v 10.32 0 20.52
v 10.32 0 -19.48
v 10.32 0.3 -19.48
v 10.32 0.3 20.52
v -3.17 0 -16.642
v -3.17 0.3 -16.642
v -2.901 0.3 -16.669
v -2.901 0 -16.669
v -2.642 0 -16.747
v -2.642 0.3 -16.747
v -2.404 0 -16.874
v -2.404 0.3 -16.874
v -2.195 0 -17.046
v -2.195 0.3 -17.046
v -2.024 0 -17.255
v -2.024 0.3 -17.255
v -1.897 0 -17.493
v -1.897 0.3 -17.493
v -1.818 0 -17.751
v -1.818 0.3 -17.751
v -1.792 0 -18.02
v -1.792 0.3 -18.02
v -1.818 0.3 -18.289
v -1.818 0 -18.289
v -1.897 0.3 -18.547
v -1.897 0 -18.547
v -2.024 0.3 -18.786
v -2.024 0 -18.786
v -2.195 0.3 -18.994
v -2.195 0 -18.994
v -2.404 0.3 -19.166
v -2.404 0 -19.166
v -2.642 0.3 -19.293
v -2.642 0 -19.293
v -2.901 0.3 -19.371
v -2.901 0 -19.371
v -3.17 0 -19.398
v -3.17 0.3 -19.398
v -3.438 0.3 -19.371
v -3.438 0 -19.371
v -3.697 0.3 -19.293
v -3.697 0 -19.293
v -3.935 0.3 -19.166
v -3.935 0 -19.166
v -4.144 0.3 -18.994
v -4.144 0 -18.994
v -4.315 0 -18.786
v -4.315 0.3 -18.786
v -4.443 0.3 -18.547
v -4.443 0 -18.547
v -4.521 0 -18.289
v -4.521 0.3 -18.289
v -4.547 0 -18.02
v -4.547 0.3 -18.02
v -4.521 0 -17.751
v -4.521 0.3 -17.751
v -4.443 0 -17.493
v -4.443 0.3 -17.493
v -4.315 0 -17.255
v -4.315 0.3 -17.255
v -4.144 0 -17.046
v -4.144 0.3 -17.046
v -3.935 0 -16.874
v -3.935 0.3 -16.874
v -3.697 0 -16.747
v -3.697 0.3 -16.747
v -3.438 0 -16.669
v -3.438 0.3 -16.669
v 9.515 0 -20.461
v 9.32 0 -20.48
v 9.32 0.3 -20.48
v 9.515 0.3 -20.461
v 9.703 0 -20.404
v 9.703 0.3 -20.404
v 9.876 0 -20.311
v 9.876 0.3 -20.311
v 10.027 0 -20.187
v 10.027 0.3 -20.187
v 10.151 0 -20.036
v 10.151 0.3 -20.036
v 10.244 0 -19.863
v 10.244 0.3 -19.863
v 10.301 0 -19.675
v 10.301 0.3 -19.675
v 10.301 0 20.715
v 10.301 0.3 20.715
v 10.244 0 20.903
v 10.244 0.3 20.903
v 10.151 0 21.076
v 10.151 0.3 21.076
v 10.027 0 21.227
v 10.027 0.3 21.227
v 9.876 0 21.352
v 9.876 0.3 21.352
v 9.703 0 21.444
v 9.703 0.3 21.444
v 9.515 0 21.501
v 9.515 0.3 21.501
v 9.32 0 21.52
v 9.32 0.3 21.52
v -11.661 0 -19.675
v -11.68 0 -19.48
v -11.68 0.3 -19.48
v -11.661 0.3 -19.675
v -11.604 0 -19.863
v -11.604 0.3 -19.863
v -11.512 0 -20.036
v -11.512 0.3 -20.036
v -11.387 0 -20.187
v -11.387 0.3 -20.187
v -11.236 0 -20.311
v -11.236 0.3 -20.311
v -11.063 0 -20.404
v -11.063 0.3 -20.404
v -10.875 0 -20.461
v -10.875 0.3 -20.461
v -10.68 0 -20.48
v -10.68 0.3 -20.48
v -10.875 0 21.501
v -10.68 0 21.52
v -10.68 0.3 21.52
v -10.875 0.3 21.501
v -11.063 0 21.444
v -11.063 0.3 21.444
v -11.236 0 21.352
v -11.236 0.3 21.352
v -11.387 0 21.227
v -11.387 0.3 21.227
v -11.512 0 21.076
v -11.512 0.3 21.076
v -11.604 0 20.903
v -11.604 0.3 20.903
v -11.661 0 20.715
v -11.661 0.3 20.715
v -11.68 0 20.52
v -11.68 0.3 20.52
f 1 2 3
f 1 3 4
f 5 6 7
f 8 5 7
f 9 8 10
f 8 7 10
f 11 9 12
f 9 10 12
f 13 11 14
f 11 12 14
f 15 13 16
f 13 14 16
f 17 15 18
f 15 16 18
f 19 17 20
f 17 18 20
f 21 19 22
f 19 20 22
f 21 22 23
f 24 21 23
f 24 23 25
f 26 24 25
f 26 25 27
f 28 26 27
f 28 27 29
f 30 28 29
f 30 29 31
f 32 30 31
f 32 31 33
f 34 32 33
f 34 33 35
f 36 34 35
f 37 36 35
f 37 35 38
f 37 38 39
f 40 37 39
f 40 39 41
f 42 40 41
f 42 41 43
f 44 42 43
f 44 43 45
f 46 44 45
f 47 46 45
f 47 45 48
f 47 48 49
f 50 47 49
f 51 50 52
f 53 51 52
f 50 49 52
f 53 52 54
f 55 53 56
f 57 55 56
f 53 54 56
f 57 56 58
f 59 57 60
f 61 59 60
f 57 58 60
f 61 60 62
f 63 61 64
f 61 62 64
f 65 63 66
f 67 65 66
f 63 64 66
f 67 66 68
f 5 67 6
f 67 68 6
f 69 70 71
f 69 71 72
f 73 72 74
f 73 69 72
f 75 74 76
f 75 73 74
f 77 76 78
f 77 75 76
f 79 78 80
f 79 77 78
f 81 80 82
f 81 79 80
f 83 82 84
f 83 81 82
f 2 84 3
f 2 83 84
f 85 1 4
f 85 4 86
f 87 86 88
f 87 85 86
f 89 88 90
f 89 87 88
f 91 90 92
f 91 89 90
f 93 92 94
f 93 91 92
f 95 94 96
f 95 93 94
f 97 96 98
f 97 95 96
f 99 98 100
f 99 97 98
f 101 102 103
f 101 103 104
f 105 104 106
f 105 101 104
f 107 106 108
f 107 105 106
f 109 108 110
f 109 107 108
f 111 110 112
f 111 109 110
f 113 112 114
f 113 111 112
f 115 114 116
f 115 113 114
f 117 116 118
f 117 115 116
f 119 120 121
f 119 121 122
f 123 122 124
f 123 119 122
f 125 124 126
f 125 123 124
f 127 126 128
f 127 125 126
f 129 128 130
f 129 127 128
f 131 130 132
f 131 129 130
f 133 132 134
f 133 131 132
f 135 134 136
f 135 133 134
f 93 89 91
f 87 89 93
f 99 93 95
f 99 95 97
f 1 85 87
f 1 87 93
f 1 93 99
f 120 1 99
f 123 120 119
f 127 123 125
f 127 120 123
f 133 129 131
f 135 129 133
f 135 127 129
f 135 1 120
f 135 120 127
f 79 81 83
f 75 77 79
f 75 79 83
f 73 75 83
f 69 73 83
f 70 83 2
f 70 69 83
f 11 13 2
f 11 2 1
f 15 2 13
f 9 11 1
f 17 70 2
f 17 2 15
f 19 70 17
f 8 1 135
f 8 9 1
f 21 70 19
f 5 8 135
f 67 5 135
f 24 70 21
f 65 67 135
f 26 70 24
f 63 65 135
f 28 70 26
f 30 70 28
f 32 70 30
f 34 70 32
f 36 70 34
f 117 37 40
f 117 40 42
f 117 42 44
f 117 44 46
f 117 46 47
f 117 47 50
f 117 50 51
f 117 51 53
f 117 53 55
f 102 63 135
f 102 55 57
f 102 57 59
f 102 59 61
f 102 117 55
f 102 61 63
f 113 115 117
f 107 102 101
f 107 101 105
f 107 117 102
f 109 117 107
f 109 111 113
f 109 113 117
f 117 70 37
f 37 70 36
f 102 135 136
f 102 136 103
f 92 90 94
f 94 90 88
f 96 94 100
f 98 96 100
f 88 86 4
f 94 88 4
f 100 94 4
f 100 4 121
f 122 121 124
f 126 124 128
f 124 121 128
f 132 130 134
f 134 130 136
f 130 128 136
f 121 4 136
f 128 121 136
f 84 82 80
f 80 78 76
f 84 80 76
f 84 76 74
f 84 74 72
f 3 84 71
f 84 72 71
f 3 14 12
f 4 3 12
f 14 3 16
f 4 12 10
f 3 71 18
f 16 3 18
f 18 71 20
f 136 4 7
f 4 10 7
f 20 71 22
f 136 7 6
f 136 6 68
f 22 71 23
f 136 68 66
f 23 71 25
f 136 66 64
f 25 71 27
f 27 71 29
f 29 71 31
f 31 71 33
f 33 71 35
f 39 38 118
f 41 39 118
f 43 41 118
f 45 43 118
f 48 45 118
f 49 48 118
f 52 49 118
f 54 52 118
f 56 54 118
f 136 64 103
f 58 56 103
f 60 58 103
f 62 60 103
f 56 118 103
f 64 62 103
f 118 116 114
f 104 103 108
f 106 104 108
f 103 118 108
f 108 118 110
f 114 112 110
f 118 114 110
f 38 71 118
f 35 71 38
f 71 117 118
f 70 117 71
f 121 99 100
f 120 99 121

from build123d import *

# Parameters (mm, degrees)
BOSS_EXTRUDE1_DEPTH = 0.3
CUT_EXTRUDE1_REACH  = 26.487
SKETCH5_R           = 1.37778755


with BuildPart() as part:
    # Sketch1 → Boss-Extrude1 (new body)
    with BuildSketch(Plane(origin=(0, 0, 0), x_dir=(1, 0, 0), z_dir=(0, 1, 0))):
        with BuildLine():
            Line((-10.68004988, 20.47995012), (9.31995012, 20.47995012))
            ThreePointArc((9.31995012, 20.47995012), (10.027056901, 20.187056901), (10.31995012, 19.47995012))
            Line((10.31995012, 19.47995012), (10.31995012, -20.52004988))
            ThreePointArc((10.31995012, -20.52004988), (10.027056901, -21.227156662), (9.31995012, -21.52004988))
            Line((9.31995012, -21.52004988), (-10.68004988, -21.52004988))
            ThreePointArc((-10.68004988, -21.52004988), (-11.387156662, -21.227156662), (-11.68004988, -20.52004988))
            Line((-11.68004988, -20.52004988), (-11.68004988, 19.47995012))
            ThreePointArc((-11.68004988, 19.47995012), (-11.387156662, 20.187056901), (-10.68004988, 20.47995012))
        make_face()
    extrude(amount=BOSS_EXTRUDE1_DEPTH)

    # Sketch5 → Cut-Extrude1 (cut, up to next)
    with BuildSketch(Plane(origin=(0, 0.3, 0), x_dir=(1, 0, 0), z_dir=(0, 1, 0)), mode=Mode.PRIVATE) as cut_extrude1_sk1:
        with Locations(Location((-3.169591585, 18.020060764, 0), (0, 0, 270))):
            Circle(SKETCH5_R)
    cut_extrude1_tool1 = extrude(cut_extrude1_sk1.sketch, amount=-CUT_EXTRUDE1_REACH, mode=Mode.PRIVATE) & part.part
    add(cut_extrude1_tool1.solids().sort_by_distance((-3.169592, 0.3, -18.020061))[0], mode=Mode.SUBTRACT)


solid = part.part
